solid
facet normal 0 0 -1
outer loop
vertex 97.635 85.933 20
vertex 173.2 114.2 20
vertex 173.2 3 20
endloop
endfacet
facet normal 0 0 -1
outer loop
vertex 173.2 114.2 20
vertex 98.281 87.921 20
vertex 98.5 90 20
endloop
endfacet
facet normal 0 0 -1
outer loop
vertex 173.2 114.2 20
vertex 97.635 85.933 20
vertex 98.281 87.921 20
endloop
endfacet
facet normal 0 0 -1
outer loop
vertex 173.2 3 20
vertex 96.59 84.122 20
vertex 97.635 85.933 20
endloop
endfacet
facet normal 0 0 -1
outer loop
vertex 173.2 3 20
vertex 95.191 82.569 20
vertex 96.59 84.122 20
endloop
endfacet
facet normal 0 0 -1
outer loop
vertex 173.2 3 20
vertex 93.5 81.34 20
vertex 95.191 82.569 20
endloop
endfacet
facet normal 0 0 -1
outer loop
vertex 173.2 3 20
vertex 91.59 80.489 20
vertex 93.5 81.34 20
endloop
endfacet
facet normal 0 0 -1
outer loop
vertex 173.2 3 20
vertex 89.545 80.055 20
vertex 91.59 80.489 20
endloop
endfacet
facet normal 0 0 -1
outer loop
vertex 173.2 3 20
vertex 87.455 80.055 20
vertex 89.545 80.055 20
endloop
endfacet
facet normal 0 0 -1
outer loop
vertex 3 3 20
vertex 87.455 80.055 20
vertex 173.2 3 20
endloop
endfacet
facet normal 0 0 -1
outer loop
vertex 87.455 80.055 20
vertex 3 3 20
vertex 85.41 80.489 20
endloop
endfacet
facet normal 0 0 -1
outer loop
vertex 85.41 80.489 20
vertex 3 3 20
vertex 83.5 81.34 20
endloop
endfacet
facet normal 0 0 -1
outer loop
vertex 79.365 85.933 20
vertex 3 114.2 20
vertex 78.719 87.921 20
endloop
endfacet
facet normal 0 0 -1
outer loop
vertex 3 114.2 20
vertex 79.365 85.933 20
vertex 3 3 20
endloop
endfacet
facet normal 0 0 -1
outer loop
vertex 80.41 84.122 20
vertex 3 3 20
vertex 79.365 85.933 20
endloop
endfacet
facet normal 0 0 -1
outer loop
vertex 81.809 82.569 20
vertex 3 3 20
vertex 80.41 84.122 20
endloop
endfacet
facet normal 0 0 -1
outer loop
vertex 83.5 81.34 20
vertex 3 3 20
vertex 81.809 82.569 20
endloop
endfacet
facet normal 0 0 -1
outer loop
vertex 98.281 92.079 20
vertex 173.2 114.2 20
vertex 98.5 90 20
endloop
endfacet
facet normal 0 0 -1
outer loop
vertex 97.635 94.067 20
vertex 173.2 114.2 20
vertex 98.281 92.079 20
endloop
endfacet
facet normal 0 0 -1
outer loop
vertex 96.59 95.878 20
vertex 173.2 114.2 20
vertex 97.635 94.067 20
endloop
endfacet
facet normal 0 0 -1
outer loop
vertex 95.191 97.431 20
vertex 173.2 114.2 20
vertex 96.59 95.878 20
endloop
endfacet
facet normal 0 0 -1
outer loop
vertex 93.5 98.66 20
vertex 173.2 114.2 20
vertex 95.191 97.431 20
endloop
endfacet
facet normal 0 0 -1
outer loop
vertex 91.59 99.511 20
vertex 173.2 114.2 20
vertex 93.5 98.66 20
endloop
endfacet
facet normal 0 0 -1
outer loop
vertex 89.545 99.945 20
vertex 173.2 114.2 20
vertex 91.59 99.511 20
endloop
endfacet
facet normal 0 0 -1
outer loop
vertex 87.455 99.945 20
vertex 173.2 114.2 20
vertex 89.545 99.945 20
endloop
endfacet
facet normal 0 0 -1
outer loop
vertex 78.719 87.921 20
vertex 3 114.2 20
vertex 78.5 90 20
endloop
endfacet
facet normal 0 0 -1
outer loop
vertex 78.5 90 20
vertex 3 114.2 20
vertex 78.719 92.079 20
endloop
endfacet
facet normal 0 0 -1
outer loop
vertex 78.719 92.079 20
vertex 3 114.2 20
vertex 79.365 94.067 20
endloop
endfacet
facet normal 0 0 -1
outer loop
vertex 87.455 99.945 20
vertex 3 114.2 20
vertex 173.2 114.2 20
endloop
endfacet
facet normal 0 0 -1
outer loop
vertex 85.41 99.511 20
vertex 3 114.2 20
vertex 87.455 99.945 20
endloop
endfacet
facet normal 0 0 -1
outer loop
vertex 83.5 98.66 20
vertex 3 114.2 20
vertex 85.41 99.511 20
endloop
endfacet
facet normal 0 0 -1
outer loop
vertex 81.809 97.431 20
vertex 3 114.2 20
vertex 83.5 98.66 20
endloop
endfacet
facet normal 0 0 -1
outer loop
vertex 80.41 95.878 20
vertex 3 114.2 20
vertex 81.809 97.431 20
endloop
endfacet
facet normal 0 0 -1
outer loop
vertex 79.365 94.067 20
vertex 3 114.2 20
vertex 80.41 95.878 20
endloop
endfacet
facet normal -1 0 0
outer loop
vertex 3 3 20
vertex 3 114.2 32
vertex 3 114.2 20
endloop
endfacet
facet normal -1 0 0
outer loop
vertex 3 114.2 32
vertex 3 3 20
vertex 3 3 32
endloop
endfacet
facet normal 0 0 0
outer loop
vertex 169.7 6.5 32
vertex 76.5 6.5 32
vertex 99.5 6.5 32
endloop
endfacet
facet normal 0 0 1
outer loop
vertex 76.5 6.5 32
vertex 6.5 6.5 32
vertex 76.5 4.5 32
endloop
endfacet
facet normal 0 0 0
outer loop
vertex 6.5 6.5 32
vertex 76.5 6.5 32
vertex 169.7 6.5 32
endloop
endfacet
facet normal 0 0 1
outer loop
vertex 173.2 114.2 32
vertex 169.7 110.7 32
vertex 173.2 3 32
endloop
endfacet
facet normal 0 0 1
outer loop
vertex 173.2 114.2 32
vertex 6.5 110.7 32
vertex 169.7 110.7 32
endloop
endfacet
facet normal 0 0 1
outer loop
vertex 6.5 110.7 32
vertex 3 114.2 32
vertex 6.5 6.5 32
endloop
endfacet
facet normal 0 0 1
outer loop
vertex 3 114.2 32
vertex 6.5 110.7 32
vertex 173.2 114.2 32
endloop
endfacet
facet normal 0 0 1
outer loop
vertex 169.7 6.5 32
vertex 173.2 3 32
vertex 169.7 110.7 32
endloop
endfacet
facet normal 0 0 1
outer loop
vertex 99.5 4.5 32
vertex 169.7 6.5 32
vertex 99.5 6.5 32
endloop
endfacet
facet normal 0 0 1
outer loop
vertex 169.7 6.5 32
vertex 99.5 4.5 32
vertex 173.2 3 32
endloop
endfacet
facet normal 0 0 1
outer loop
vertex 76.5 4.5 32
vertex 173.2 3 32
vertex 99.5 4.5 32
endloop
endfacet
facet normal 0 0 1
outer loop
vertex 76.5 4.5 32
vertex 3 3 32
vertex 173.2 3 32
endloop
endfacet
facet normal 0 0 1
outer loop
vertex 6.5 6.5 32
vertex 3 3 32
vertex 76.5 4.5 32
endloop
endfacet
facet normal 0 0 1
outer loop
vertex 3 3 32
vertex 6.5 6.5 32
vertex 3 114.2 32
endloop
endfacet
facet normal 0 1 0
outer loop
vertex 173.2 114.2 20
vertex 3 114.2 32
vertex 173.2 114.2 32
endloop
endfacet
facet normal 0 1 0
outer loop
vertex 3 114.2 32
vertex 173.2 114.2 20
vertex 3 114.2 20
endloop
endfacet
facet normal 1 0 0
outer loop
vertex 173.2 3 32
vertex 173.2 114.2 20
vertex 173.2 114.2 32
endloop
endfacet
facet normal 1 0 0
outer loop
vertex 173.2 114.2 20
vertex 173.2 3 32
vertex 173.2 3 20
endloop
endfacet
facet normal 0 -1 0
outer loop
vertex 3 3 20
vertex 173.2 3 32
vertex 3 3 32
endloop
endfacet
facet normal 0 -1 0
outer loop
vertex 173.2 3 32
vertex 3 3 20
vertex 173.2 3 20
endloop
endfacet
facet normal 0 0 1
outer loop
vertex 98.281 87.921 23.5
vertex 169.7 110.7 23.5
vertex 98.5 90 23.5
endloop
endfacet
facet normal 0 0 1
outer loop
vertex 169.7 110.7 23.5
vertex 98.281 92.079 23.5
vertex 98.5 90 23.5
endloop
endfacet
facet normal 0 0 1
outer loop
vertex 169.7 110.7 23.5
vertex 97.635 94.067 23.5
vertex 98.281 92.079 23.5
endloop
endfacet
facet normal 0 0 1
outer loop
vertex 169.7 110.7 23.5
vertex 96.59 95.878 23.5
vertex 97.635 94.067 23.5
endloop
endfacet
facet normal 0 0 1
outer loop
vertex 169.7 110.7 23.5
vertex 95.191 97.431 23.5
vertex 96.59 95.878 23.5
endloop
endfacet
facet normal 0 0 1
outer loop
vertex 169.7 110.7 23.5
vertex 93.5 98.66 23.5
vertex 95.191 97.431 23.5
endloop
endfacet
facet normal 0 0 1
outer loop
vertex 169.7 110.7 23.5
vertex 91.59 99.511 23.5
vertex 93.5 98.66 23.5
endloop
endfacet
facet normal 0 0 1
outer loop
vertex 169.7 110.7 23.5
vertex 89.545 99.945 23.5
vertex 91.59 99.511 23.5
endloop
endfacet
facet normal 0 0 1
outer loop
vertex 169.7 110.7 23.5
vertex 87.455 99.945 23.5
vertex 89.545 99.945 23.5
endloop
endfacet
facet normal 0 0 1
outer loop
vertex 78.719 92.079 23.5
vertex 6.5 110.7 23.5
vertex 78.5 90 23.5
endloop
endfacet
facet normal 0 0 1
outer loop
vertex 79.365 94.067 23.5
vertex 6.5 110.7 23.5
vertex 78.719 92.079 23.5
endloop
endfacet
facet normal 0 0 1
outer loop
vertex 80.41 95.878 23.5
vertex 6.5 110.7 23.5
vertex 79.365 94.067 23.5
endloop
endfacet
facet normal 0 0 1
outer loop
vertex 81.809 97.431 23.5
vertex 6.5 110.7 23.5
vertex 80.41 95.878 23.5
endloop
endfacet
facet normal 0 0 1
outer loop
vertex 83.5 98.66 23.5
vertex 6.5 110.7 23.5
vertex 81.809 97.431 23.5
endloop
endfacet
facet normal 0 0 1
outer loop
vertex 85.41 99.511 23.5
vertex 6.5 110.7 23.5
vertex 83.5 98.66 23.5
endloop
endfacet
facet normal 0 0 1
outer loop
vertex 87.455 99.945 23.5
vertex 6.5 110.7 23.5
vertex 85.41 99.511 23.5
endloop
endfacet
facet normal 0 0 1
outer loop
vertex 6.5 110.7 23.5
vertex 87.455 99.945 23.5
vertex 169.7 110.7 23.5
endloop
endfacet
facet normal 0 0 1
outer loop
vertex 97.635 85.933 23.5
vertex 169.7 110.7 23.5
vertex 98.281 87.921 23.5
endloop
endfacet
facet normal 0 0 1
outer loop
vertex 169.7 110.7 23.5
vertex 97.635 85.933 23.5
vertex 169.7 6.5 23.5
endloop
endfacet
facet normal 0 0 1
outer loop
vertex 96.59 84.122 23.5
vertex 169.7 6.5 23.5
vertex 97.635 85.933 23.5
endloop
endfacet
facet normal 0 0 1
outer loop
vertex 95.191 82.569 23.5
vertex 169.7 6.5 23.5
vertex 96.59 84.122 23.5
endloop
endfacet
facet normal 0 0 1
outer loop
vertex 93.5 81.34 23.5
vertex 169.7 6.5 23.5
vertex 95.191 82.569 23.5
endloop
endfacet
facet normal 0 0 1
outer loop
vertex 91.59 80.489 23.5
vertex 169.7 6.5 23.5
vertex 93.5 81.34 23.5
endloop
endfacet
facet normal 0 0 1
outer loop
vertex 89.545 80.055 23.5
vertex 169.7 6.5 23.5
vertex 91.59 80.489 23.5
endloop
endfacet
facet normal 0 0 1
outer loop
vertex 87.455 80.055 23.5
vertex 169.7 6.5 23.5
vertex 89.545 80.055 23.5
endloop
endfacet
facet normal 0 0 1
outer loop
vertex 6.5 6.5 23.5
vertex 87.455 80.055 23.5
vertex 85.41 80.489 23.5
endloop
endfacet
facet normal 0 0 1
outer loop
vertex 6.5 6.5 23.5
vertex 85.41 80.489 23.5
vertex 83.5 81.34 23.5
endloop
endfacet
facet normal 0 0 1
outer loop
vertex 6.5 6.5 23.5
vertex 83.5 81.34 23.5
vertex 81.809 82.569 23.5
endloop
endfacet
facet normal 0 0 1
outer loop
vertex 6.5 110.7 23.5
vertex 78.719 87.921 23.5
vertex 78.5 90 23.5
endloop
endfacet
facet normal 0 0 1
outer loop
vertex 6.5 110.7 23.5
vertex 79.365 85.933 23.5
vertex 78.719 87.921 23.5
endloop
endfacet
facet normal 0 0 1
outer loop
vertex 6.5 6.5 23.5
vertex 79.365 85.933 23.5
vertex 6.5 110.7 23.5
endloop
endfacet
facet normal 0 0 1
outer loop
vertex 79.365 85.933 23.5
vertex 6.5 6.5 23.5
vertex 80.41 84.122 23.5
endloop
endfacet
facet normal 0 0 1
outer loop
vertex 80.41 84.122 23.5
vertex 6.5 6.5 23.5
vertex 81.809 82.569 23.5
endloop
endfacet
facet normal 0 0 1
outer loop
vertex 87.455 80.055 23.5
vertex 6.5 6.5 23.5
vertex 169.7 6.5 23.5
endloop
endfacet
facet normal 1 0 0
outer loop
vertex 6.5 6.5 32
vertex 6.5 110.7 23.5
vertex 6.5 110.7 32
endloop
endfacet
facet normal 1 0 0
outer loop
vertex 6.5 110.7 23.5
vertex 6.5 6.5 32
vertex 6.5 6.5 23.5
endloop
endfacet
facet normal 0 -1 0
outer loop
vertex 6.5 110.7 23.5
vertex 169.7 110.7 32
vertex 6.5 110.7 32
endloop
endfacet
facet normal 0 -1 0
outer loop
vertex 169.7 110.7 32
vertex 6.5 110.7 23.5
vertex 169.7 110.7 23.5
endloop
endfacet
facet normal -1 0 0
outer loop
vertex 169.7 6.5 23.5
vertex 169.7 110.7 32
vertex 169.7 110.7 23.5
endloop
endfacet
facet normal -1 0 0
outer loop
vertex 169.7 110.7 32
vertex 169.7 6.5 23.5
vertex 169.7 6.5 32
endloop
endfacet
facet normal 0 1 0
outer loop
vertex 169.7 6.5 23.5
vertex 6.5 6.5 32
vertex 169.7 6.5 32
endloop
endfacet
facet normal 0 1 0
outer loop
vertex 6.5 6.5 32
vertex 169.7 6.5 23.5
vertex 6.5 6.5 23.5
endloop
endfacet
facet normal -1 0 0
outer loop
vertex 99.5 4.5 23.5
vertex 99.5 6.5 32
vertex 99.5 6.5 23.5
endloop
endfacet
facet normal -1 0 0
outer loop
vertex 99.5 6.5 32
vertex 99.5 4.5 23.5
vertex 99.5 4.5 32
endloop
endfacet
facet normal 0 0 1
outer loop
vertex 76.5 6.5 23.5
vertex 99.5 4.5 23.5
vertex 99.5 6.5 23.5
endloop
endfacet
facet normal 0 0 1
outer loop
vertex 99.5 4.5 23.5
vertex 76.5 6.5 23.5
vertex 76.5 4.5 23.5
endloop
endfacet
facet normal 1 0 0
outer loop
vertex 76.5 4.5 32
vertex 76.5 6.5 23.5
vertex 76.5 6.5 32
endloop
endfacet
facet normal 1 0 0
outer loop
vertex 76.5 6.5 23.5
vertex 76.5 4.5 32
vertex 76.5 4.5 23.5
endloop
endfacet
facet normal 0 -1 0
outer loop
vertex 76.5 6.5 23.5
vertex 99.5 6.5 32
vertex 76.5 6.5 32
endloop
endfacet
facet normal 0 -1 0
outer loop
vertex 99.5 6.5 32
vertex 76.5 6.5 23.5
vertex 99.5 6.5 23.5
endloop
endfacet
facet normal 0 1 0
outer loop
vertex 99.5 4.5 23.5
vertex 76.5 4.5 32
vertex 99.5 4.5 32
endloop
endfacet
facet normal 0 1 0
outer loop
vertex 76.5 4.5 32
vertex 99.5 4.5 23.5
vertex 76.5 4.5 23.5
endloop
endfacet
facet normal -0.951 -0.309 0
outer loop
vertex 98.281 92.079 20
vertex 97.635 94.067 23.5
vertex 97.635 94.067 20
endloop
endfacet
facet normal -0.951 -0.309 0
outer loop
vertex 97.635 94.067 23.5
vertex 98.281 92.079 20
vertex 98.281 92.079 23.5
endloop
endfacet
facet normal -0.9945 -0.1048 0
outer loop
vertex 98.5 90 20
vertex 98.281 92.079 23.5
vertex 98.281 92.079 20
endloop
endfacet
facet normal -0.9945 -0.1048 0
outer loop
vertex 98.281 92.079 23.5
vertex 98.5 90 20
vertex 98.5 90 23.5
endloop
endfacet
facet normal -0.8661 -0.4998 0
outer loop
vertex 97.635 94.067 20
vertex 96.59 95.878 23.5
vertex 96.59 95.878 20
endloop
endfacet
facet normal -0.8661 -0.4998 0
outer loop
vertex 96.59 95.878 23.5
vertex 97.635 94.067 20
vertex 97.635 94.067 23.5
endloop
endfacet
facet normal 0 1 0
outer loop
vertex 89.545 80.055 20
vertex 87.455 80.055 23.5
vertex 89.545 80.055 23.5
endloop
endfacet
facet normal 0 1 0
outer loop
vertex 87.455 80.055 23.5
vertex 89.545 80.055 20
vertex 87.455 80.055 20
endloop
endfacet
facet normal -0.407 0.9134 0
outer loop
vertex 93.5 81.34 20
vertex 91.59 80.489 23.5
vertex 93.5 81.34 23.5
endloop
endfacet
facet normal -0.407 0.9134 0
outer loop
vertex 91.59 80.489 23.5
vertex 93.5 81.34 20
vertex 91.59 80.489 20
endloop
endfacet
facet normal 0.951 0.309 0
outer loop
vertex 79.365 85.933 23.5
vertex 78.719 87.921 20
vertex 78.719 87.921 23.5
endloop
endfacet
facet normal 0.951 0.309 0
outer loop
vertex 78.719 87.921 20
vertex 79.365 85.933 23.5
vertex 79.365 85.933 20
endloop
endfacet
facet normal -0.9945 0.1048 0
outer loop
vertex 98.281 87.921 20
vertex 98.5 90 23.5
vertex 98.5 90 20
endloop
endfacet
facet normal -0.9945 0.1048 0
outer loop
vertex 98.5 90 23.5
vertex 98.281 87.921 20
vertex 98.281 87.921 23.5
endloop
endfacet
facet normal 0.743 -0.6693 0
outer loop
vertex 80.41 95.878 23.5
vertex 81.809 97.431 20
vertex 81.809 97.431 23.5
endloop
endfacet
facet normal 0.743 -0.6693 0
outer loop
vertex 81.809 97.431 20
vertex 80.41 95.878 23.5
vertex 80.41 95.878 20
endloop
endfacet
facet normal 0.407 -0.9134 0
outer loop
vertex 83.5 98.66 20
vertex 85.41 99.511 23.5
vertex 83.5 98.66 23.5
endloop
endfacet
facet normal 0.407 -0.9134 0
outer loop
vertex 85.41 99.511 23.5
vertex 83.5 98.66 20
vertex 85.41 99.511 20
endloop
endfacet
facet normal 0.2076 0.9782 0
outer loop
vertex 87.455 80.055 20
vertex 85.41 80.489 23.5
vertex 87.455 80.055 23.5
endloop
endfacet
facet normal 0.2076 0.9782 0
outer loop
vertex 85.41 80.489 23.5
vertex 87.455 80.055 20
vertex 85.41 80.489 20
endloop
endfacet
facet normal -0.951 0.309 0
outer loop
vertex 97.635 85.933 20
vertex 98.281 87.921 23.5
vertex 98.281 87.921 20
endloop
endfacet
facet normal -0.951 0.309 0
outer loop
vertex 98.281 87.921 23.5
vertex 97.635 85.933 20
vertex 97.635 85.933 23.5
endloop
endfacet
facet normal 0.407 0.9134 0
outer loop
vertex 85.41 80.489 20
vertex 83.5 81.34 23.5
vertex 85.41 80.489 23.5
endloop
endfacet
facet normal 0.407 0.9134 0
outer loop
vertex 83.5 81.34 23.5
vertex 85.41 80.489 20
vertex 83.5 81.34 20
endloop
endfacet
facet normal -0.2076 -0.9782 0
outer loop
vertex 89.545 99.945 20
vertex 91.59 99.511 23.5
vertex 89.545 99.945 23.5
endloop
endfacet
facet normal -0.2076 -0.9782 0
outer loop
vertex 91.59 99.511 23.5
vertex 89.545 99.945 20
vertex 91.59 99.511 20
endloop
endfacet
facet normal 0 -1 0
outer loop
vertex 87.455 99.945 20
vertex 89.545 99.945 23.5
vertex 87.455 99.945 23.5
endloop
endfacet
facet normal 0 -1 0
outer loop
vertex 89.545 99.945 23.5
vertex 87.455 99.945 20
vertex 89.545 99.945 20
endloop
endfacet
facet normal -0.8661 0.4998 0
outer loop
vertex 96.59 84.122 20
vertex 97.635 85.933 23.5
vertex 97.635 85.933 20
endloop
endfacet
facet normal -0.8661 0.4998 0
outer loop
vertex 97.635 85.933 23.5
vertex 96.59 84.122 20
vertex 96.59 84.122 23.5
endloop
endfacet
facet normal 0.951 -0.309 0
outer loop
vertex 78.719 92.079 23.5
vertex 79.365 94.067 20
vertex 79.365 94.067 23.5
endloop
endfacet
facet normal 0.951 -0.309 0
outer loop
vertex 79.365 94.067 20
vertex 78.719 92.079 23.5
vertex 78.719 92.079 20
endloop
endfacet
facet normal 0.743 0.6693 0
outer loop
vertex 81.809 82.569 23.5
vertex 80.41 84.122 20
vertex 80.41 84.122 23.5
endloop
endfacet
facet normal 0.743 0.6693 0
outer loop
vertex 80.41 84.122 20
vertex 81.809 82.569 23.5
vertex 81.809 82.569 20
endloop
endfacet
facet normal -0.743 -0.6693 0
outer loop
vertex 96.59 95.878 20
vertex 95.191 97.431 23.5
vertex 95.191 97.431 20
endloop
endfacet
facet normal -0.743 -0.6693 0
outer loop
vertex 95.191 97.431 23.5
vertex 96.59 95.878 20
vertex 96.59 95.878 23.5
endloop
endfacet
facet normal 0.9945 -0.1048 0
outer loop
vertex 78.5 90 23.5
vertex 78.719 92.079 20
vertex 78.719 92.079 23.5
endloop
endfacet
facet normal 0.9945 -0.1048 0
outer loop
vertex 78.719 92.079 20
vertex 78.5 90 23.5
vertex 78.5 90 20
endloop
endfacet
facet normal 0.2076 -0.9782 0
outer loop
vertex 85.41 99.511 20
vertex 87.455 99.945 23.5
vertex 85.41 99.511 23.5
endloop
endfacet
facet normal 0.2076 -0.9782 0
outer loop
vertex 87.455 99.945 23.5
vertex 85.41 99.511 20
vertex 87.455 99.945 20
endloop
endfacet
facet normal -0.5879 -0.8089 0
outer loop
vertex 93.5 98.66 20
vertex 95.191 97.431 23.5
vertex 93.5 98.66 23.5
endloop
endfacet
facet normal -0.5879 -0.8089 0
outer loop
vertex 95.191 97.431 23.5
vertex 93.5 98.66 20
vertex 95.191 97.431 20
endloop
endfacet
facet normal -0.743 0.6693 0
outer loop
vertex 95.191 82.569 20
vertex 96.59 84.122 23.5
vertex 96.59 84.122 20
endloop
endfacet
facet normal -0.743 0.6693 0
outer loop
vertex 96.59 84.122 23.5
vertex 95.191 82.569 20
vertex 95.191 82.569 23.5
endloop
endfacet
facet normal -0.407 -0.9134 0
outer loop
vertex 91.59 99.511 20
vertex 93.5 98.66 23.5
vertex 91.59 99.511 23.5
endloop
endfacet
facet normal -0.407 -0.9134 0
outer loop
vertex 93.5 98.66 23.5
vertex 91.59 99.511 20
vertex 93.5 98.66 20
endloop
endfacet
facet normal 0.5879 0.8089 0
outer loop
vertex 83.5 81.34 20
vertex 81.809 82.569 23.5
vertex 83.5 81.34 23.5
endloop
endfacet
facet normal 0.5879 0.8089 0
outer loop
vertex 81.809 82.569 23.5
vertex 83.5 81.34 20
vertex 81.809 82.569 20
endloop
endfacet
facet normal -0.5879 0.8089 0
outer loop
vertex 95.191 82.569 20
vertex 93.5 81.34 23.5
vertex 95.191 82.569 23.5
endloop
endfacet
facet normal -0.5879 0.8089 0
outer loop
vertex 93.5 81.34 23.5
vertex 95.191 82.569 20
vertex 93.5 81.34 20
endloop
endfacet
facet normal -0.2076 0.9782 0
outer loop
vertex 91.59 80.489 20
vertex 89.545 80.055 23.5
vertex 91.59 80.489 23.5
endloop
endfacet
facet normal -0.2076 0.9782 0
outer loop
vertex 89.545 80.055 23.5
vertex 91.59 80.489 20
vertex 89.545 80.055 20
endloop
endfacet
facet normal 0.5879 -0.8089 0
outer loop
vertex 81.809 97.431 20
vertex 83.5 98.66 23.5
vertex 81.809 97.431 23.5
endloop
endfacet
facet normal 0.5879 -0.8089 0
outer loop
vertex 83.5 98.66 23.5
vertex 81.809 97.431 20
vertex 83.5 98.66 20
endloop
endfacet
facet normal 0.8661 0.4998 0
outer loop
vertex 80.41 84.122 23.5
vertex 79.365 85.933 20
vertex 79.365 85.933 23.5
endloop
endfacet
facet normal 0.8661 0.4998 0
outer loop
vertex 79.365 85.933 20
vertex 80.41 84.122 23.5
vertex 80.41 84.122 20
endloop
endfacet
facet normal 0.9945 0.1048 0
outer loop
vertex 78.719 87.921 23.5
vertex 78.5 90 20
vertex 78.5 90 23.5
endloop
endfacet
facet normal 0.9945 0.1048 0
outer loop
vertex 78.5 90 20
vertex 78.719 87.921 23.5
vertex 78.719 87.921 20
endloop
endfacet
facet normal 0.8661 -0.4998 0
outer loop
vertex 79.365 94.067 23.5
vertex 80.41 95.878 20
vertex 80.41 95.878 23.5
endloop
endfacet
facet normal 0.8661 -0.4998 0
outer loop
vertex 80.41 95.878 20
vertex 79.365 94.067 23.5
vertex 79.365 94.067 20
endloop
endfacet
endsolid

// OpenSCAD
use <myTools.scad>

MM=25.43;

bMakeFront = false;//false;//true;
bMakeSides = false; 
 
bMakeBack = true; //true;

TWEAK=.8;

epaper_length = 170.20 + TWEAK; //170.20 on spec
epaper_width = 111.20 + TWEAK ; // 111.2 on spec
epaper_thick = 1.2 + TWEAK;     // 1.2 +/- .1 on spec

LCD_WHITE_BOARDER = 3.5;
LCD_WHITE_HEIGHT = 111.20 - 97.92 - 3.49; 
LCD_WHITE_WIDTH = 163.2;     



outside_height = 10;
BEZEL_THICK = 3;
BOTTOM_WALL_REDUCTION = 2;

flex_cable_wide = epaper_length - 2 * 74 ;
flex_cable_offset = 78.5 - 5;
MYLAR_FEED = [flex_cable_wide, 2, 15 ];


if (bMakeBack)
{
    rotate([0, 0, 0 ])
    translate([ BEZEL_THICK, BEZEL_THICK, 20])
    {
        difference()
        {
            // don't need box to have max emptyness, raise floor via elevator = 3
            color("CYAN")
            abox([epaper_length - TWEAK, 
                  epaper_width - TWEAK, 
                  outside_height * 1.2 ], 
                  thick = -LCD_WHITE_BOARDER, 
                  bHollow = false, 
                  bCentered = false);

            translate([ flex_cable_offset,  
                        BEZEL_THICK/2,
                        LCD_WHITE_BOARDER])
            color("GREEN")
            #cube(MYLAR_FEED , center = false);
            
            translate([ epaper_length/2,  
                epaper_width - 25,
                -LCD_WHITE_BOARDER])
                
                color("GREEN")
                #cylinder(d=20, h=10);

        }
    }
}
//----------------------------------------------------------------------------------------

if (bMakeSides)
{
    //rotate([ 0, 0, 180])
    difference()
    {
        // don't need box to have max emptyness, raise floor via elevator = 3
        abox([epaper_length,
              epaper_width, 
              outside_height], 
              thick = +BEZEL_THICK,
              bHollow = true, 
              bCentered = false);

        translate([ flex_cable_offset,  
                    BEZEL_THICK/2,
                    LCD_WHITE_BOARDER])
        color("RED")
        #cube(MYLAR_FEED , center = false);
        

    }
}
//----------------------------------------------------------------------------------------

if (bMakeFront)
{
    //
    //  MAKE HOLD DOWN FRAME

    translate([ BEZEL_THICK, BEZEL_THICK, 0])
    union()
    {
        // don't need box to have max emptyness, raise floor via elevator = 3
        color("CYAN")
        abox([epaper_length, 
              epaper_width, 
              LCD_WHITE_BOARDER ], 
              thick = -LCD_WHITE_BOARDER, 
              bHollow = true, 
              bCentered = false);


        // hide white frame of display
        // don't need box to have max emptyness, raise floor via elevator = 3
        color("BLUE")
        translate([LCD_WHITE_BOARDER, 
                    0, //LCD_WHITE_BOARDER, 
                    0])
                    
        abox([LCD_WHITE_WIDTH + TWEAK,
              LCD_WHITE_HEIGHT, 
              3.5],
              thick = -3.5, 
              bSolid = true,
              bCentered = false);


    }
}
